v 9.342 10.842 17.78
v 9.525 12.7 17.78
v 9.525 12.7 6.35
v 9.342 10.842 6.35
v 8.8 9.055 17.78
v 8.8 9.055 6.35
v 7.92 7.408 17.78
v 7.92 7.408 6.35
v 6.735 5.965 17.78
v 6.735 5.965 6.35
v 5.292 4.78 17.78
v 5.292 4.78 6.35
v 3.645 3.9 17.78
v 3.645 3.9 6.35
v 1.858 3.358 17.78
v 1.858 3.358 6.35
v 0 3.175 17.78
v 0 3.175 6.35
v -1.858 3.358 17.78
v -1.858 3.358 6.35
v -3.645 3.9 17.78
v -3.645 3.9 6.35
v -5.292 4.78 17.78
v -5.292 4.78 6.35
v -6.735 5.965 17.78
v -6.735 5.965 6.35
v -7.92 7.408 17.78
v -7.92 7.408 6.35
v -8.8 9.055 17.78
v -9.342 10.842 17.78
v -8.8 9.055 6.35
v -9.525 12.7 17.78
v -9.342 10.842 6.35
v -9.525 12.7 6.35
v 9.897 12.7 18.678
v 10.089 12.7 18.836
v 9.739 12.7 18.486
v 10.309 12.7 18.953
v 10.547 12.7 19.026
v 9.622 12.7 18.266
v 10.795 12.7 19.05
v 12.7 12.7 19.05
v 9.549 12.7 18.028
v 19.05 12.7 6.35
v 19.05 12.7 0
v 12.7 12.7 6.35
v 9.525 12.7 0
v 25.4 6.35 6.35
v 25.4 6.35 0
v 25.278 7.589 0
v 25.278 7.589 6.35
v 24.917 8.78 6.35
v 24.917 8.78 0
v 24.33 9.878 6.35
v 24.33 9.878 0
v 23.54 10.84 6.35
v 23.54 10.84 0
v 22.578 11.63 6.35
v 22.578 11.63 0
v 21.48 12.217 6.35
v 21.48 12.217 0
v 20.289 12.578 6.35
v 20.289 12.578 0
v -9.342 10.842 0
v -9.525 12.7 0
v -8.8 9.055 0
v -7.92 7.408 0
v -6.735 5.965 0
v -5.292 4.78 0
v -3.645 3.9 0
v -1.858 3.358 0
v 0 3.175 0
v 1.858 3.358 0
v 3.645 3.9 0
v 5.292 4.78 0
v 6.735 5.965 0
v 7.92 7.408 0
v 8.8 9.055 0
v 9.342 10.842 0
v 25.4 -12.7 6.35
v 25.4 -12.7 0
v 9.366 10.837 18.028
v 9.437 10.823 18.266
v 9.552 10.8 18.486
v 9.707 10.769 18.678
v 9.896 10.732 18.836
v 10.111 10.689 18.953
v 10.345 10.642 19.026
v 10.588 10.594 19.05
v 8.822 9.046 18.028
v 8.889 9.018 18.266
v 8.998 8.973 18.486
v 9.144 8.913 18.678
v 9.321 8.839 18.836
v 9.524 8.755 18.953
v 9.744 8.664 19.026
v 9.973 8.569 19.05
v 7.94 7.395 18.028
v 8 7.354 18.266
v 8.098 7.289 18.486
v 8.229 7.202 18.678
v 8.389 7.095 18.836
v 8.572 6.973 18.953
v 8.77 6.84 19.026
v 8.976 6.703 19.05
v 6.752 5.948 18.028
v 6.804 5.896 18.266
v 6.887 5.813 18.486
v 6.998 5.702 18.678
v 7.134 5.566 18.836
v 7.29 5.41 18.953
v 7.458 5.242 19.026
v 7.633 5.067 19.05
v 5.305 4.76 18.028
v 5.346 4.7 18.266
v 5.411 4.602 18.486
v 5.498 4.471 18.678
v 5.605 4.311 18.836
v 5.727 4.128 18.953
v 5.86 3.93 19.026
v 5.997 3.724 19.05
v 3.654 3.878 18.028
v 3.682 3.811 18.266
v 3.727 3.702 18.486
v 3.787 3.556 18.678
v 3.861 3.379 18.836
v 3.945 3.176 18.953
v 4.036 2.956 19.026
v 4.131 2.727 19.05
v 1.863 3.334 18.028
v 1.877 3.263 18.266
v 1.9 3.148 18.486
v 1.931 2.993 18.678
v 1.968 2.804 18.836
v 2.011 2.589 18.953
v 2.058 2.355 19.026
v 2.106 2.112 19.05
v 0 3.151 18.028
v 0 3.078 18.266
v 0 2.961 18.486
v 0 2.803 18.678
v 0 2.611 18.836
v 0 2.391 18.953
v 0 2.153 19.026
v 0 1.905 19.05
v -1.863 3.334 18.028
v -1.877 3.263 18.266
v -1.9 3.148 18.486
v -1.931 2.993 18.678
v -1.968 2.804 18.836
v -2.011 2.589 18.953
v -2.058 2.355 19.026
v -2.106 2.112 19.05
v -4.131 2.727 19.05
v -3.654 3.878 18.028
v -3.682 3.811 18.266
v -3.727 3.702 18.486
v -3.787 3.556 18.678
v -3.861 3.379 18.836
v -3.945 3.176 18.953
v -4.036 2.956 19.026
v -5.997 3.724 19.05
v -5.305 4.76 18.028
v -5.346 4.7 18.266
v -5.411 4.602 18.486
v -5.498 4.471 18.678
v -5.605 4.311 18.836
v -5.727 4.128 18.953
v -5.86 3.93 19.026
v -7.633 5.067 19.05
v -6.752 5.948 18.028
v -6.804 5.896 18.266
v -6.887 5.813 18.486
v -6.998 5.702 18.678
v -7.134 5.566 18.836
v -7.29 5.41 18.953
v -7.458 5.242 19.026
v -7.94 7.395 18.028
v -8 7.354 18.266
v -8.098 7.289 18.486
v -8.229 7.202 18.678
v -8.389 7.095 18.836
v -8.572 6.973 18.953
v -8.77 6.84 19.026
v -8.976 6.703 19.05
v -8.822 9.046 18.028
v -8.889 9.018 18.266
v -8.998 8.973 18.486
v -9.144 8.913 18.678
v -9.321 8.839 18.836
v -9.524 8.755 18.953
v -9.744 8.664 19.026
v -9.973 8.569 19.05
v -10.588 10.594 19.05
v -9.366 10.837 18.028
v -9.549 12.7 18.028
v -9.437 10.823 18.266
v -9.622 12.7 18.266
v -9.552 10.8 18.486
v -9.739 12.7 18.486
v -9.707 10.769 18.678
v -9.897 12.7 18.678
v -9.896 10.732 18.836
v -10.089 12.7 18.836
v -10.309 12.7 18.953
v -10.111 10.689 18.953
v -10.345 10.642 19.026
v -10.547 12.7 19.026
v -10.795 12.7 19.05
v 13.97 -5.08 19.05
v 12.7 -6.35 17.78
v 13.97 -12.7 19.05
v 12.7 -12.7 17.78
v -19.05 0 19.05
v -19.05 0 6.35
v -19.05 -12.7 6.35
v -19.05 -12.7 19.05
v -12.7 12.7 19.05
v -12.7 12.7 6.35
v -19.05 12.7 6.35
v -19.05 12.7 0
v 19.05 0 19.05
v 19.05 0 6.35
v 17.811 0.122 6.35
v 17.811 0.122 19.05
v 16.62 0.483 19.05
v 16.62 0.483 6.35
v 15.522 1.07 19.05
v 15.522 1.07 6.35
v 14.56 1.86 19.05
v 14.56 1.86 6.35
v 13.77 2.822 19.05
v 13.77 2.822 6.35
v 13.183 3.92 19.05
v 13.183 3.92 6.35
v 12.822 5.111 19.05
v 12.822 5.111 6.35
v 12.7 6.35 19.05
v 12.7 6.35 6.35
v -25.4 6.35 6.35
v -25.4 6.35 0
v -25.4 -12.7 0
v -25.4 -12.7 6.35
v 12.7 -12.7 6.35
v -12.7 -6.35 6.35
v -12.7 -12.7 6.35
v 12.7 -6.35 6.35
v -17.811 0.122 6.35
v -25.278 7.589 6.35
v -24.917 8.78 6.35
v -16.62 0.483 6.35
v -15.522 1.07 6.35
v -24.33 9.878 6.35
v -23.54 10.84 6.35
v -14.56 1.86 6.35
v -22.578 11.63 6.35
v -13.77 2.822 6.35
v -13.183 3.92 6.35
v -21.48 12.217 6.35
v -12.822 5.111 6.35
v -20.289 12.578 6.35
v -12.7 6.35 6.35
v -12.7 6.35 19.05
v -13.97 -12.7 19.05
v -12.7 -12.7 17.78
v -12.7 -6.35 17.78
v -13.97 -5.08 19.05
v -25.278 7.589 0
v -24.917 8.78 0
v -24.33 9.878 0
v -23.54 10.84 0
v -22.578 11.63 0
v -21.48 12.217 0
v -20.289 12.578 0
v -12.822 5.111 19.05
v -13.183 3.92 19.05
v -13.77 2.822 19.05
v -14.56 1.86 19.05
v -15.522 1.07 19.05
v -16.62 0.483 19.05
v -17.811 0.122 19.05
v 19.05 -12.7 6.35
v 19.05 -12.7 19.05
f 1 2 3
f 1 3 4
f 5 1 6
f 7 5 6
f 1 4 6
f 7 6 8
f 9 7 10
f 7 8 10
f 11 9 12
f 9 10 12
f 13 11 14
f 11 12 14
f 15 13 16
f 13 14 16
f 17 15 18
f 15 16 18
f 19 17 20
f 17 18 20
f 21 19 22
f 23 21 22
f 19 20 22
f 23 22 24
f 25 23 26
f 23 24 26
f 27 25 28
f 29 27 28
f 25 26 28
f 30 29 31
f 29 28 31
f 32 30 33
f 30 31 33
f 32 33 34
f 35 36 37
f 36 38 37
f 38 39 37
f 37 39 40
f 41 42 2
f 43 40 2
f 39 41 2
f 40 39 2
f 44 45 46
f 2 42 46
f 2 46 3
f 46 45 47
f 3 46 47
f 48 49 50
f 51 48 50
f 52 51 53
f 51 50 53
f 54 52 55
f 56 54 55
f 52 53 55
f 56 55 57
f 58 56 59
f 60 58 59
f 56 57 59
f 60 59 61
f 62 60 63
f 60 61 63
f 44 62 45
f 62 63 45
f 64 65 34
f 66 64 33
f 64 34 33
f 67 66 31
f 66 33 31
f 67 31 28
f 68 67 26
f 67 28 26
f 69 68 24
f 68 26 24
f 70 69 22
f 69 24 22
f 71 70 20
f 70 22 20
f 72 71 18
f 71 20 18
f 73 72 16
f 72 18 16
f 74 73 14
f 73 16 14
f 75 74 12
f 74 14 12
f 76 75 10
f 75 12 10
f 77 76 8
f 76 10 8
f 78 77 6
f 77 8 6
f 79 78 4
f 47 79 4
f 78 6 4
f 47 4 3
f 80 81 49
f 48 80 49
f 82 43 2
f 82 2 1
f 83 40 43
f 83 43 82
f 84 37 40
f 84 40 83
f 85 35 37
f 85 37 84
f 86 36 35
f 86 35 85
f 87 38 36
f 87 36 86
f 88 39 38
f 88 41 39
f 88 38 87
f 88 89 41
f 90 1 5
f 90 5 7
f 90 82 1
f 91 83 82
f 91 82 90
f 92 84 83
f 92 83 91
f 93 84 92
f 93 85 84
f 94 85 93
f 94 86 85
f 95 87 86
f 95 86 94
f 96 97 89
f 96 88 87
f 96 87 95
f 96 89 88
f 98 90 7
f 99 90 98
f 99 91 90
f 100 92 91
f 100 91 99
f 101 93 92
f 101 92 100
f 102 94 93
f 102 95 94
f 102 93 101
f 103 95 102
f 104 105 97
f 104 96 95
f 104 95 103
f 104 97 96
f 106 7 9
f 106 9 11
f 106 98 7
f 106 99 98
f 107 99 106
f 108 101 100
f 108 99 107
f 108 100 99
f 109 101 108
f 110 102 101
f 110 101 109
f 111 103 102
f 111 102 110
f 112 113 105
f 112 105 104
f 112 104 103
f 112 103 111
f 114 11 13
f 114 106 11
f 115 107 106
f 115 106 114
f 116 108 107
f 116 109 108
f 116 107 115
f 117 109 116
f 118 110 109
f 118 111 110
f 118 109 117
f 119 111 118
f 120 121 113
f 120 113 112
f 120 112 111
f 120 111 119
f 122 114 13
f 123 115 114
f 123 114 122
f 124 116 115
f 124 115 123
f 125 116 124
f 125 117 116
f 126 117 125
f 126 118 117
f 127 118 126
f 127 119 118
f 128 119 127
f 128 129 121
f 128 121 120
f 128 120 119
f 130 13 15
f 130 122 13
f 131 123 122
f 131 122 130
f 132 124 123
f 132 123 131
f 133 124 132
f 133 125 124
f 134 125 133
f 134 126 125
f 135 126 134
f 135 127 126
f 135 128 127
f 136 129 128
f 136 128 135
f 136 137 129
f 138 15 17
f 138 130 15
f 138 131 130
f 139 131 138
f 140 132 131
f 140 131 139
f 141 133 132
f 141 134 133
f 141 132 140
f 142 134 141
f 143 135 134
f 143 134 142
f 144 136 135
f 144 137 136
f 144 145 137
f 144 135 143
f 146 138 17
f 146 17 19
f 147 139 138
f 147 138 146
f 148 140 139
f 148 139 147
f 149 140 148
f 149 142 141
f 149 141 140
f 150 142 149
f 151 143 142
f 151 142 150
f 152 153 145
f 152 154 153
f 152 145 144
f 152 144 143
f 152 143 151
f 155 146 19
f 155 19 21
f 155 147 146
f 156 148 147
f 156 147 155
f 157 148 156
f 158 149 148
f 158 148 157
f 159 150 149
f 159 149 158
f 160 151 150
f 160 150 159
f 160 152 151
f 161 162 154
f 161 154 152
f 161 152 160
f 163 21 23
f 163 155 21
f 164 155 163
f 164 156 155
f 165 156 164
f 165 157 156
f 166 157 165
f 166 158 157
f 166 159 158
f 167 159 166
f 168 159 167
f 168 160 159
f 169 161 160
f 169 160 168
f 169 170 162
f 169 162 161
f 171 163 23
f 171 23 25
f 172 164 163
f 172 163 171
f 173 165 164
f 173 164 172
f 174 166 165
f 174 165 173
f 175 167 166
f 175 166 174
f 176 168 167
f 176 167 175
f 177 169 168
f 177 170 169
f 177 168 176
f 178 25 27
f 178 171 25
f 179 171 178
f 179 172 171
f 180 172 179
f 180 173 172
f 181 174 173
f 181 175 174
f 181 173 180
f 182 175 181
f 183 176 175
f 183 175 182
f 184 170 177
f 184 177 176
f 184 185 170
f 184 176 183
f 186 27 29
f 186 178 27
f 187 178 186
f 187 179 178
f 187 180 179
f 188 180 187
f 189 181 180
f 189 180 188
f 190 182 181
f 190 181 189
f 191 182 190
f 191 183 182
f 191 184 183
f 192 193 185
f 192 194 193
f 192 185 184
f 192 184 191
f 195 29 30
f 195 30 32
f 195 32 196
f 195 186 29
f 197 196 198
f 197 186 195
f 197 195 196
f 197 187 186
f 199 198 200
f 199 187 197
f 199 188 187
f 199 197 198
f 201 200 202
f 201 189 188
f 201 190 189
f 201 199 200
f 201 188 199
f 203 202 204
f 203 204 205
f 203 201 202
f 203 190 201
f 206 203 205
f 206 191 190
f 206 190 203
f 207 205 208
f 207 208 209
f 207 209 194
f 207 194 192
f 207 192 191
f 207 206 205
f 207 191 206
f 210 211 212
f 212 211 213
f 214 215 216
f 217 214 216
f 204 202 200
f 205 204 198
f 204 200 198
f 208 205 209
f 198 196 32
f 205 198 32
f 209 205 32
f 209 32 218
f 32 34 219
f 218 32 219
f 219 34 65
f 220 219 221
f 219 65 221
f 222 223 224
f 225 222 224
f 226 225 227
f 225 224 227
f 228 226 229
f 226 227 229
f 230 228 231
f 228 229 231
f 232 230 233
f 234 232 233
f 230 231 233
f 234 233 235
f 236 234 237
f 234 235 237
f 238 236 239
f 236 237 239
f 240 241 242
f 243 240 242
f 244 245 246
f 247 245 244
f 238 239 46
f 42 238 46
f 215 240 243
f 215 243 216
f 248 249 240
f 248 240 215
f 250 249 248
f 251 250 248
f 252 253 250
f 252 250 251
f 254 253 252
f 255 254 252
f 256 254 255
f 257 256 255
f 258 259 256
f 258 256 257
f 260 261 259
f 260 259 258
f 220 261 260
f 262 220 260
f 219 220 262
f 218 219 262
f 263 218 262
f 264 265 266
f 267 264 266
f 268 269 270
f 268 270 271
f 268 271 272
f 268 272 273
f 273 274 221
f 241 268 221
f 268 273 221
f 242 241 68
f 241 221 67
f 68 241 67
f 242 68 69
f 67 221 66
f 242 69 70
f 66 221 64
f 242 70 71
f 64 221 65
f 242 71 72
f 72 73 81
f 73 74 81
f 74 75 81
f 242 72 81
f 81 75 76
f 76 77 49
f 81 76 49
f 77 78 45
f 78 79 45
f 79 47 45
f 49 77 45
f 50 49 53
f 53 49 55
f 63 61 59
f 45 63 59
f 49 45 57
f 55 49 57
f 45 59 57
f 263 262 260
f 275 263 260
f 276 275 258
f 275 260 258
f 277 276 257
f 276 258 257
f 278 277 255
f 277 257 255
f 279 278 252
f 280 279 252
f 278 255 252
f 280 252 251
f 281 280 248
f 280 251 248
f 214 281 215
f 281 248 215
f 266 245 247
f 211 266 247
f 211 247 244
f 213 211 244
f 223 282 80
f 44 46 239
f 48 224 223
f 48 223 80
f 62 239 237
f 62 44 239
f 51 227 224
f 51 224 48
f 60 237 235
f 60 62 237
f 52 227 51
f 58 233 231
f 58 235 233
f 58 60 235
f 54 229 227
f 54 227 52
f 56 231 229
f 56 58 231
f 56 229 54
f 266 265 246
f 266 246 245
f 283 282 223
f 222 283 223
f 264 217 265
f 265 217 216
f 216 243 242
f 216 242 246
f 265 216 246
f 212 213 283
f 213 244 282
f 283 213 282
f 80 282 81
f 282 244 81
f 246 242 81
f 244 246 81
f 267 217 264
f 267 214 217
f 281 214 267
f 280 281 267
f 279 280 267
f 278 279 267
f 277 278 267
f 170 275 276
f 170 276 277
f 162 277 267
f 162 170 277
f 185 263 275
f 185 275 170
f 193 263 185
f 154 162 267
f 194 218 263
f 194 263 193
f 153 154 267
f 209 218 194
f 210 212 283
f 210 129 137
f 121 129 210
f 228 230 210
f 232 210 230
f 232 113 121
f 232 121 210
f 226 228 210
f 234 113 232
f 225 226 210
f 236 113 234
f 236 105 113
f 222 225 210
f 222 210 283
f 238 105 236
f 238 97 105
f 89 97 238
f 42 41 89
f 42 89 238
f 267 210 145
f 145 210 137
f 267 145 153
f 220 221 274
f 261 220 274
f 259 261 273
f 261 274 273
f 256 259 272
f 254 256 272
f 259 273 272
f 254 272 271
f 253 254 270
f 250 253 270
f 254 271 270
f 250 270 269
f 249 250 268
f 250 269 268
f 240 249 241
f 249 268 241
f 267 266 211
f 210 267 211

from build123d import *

# Parameters (mm, degrees)
F1_DEPTH = 6.35
F3_DEPTH = 12.7
F4_R     = 9.525
F5_DEPTH = 25.4
F6_R     = 1.27
F7_SIZE  = 1.27


with BuildPart() as f1:
    # F0 (on Top) → F1 (new body)
    with BuildSketch(Plane.XY):
        with BuildLine():
            ThreePointArc((25.4, 6.35), (23.540128, 10.840128), (19.05, 12.7))
            Line((19.05, 12.7), (-19.05, 12.7))
            ThreePointArc((-19.05, 12.7), (-23.540128, 10.840128), (-25.4, 6.35))
            Line((-25.4, 6.35), (-25.4, -12.7))
            Line((-25.4, -12.7), (25.4, -12.7))
            Line((25.4, -12.7), (25.4, 6.35))
        make_face()
    extrude(amount=F1_DEPTH)

    # F2 (on face) → F3 (join)
    with BuildSketch(Plane.XY.offset(6.35)):
        with BuildLine():
            Line((-9.525, 12.7), (-12.7, 12.7))
            Line((-12.7, 12.7), (-12.7, 6.35))
            ThreePointArc((-12.7, 6.35), (-14.559872, 1.859872), (-19.05, 0))
            Line((-19.05, 0), (-19.05, -12.7))
            Line((-19.05, -12.7), (-12.7, -12.7))
            Line((-12.7, -12.7), (-12.7, -6.35))
            Line((-12.7, -6.35), (12.7, -6.35))
            Line((12.7, -6.35), (12.7, -12.7))
            Line((12.7, -12.7), (19.05, -12.7))
            Line((19.05, -12.7), (19.05, 0))
            ThreePointArc((19.05, 0), (14.559872, 1.859872), (12.7, 6.35))
            Line((12.7, 6.35), (12.7, 12.7))
            Line((12.7, 12.7), (9.525, 12.7))
            ThreePointArc((9.525, 12.7), (0, 3.175), (-9.525, 12.7))
        make_face()
    extrude(amount=F3_DEPTH)

    # F4 (on face) → F5 (cut)
    with BuildSketch(Plane.XY.offset(6.35)):
        with Locations((0, 12.7)):
            Circle(F4_R)
    extrude(amount=-F5_DEPTH, mode=Mode.SUBTRACT)

    # F6
    f6_edges = [f1.edges().sort_by_distance(p)[0] for p in [
        (0, 3.175, 19.05),
    ]]
    fillet(f6_edges, radius=F6_R)

    # F7
    f7_edges = [f1.edges().sort_by_distance(p)[0] for p in [
        (0, -6.35, 19.05),
        (12.7, -9.525, 19.05),
        (-12.7, -9.525, 19.05),
    ]]
    chamfer(f7_edges, length=F7_SIZE)


solid = f1.part
